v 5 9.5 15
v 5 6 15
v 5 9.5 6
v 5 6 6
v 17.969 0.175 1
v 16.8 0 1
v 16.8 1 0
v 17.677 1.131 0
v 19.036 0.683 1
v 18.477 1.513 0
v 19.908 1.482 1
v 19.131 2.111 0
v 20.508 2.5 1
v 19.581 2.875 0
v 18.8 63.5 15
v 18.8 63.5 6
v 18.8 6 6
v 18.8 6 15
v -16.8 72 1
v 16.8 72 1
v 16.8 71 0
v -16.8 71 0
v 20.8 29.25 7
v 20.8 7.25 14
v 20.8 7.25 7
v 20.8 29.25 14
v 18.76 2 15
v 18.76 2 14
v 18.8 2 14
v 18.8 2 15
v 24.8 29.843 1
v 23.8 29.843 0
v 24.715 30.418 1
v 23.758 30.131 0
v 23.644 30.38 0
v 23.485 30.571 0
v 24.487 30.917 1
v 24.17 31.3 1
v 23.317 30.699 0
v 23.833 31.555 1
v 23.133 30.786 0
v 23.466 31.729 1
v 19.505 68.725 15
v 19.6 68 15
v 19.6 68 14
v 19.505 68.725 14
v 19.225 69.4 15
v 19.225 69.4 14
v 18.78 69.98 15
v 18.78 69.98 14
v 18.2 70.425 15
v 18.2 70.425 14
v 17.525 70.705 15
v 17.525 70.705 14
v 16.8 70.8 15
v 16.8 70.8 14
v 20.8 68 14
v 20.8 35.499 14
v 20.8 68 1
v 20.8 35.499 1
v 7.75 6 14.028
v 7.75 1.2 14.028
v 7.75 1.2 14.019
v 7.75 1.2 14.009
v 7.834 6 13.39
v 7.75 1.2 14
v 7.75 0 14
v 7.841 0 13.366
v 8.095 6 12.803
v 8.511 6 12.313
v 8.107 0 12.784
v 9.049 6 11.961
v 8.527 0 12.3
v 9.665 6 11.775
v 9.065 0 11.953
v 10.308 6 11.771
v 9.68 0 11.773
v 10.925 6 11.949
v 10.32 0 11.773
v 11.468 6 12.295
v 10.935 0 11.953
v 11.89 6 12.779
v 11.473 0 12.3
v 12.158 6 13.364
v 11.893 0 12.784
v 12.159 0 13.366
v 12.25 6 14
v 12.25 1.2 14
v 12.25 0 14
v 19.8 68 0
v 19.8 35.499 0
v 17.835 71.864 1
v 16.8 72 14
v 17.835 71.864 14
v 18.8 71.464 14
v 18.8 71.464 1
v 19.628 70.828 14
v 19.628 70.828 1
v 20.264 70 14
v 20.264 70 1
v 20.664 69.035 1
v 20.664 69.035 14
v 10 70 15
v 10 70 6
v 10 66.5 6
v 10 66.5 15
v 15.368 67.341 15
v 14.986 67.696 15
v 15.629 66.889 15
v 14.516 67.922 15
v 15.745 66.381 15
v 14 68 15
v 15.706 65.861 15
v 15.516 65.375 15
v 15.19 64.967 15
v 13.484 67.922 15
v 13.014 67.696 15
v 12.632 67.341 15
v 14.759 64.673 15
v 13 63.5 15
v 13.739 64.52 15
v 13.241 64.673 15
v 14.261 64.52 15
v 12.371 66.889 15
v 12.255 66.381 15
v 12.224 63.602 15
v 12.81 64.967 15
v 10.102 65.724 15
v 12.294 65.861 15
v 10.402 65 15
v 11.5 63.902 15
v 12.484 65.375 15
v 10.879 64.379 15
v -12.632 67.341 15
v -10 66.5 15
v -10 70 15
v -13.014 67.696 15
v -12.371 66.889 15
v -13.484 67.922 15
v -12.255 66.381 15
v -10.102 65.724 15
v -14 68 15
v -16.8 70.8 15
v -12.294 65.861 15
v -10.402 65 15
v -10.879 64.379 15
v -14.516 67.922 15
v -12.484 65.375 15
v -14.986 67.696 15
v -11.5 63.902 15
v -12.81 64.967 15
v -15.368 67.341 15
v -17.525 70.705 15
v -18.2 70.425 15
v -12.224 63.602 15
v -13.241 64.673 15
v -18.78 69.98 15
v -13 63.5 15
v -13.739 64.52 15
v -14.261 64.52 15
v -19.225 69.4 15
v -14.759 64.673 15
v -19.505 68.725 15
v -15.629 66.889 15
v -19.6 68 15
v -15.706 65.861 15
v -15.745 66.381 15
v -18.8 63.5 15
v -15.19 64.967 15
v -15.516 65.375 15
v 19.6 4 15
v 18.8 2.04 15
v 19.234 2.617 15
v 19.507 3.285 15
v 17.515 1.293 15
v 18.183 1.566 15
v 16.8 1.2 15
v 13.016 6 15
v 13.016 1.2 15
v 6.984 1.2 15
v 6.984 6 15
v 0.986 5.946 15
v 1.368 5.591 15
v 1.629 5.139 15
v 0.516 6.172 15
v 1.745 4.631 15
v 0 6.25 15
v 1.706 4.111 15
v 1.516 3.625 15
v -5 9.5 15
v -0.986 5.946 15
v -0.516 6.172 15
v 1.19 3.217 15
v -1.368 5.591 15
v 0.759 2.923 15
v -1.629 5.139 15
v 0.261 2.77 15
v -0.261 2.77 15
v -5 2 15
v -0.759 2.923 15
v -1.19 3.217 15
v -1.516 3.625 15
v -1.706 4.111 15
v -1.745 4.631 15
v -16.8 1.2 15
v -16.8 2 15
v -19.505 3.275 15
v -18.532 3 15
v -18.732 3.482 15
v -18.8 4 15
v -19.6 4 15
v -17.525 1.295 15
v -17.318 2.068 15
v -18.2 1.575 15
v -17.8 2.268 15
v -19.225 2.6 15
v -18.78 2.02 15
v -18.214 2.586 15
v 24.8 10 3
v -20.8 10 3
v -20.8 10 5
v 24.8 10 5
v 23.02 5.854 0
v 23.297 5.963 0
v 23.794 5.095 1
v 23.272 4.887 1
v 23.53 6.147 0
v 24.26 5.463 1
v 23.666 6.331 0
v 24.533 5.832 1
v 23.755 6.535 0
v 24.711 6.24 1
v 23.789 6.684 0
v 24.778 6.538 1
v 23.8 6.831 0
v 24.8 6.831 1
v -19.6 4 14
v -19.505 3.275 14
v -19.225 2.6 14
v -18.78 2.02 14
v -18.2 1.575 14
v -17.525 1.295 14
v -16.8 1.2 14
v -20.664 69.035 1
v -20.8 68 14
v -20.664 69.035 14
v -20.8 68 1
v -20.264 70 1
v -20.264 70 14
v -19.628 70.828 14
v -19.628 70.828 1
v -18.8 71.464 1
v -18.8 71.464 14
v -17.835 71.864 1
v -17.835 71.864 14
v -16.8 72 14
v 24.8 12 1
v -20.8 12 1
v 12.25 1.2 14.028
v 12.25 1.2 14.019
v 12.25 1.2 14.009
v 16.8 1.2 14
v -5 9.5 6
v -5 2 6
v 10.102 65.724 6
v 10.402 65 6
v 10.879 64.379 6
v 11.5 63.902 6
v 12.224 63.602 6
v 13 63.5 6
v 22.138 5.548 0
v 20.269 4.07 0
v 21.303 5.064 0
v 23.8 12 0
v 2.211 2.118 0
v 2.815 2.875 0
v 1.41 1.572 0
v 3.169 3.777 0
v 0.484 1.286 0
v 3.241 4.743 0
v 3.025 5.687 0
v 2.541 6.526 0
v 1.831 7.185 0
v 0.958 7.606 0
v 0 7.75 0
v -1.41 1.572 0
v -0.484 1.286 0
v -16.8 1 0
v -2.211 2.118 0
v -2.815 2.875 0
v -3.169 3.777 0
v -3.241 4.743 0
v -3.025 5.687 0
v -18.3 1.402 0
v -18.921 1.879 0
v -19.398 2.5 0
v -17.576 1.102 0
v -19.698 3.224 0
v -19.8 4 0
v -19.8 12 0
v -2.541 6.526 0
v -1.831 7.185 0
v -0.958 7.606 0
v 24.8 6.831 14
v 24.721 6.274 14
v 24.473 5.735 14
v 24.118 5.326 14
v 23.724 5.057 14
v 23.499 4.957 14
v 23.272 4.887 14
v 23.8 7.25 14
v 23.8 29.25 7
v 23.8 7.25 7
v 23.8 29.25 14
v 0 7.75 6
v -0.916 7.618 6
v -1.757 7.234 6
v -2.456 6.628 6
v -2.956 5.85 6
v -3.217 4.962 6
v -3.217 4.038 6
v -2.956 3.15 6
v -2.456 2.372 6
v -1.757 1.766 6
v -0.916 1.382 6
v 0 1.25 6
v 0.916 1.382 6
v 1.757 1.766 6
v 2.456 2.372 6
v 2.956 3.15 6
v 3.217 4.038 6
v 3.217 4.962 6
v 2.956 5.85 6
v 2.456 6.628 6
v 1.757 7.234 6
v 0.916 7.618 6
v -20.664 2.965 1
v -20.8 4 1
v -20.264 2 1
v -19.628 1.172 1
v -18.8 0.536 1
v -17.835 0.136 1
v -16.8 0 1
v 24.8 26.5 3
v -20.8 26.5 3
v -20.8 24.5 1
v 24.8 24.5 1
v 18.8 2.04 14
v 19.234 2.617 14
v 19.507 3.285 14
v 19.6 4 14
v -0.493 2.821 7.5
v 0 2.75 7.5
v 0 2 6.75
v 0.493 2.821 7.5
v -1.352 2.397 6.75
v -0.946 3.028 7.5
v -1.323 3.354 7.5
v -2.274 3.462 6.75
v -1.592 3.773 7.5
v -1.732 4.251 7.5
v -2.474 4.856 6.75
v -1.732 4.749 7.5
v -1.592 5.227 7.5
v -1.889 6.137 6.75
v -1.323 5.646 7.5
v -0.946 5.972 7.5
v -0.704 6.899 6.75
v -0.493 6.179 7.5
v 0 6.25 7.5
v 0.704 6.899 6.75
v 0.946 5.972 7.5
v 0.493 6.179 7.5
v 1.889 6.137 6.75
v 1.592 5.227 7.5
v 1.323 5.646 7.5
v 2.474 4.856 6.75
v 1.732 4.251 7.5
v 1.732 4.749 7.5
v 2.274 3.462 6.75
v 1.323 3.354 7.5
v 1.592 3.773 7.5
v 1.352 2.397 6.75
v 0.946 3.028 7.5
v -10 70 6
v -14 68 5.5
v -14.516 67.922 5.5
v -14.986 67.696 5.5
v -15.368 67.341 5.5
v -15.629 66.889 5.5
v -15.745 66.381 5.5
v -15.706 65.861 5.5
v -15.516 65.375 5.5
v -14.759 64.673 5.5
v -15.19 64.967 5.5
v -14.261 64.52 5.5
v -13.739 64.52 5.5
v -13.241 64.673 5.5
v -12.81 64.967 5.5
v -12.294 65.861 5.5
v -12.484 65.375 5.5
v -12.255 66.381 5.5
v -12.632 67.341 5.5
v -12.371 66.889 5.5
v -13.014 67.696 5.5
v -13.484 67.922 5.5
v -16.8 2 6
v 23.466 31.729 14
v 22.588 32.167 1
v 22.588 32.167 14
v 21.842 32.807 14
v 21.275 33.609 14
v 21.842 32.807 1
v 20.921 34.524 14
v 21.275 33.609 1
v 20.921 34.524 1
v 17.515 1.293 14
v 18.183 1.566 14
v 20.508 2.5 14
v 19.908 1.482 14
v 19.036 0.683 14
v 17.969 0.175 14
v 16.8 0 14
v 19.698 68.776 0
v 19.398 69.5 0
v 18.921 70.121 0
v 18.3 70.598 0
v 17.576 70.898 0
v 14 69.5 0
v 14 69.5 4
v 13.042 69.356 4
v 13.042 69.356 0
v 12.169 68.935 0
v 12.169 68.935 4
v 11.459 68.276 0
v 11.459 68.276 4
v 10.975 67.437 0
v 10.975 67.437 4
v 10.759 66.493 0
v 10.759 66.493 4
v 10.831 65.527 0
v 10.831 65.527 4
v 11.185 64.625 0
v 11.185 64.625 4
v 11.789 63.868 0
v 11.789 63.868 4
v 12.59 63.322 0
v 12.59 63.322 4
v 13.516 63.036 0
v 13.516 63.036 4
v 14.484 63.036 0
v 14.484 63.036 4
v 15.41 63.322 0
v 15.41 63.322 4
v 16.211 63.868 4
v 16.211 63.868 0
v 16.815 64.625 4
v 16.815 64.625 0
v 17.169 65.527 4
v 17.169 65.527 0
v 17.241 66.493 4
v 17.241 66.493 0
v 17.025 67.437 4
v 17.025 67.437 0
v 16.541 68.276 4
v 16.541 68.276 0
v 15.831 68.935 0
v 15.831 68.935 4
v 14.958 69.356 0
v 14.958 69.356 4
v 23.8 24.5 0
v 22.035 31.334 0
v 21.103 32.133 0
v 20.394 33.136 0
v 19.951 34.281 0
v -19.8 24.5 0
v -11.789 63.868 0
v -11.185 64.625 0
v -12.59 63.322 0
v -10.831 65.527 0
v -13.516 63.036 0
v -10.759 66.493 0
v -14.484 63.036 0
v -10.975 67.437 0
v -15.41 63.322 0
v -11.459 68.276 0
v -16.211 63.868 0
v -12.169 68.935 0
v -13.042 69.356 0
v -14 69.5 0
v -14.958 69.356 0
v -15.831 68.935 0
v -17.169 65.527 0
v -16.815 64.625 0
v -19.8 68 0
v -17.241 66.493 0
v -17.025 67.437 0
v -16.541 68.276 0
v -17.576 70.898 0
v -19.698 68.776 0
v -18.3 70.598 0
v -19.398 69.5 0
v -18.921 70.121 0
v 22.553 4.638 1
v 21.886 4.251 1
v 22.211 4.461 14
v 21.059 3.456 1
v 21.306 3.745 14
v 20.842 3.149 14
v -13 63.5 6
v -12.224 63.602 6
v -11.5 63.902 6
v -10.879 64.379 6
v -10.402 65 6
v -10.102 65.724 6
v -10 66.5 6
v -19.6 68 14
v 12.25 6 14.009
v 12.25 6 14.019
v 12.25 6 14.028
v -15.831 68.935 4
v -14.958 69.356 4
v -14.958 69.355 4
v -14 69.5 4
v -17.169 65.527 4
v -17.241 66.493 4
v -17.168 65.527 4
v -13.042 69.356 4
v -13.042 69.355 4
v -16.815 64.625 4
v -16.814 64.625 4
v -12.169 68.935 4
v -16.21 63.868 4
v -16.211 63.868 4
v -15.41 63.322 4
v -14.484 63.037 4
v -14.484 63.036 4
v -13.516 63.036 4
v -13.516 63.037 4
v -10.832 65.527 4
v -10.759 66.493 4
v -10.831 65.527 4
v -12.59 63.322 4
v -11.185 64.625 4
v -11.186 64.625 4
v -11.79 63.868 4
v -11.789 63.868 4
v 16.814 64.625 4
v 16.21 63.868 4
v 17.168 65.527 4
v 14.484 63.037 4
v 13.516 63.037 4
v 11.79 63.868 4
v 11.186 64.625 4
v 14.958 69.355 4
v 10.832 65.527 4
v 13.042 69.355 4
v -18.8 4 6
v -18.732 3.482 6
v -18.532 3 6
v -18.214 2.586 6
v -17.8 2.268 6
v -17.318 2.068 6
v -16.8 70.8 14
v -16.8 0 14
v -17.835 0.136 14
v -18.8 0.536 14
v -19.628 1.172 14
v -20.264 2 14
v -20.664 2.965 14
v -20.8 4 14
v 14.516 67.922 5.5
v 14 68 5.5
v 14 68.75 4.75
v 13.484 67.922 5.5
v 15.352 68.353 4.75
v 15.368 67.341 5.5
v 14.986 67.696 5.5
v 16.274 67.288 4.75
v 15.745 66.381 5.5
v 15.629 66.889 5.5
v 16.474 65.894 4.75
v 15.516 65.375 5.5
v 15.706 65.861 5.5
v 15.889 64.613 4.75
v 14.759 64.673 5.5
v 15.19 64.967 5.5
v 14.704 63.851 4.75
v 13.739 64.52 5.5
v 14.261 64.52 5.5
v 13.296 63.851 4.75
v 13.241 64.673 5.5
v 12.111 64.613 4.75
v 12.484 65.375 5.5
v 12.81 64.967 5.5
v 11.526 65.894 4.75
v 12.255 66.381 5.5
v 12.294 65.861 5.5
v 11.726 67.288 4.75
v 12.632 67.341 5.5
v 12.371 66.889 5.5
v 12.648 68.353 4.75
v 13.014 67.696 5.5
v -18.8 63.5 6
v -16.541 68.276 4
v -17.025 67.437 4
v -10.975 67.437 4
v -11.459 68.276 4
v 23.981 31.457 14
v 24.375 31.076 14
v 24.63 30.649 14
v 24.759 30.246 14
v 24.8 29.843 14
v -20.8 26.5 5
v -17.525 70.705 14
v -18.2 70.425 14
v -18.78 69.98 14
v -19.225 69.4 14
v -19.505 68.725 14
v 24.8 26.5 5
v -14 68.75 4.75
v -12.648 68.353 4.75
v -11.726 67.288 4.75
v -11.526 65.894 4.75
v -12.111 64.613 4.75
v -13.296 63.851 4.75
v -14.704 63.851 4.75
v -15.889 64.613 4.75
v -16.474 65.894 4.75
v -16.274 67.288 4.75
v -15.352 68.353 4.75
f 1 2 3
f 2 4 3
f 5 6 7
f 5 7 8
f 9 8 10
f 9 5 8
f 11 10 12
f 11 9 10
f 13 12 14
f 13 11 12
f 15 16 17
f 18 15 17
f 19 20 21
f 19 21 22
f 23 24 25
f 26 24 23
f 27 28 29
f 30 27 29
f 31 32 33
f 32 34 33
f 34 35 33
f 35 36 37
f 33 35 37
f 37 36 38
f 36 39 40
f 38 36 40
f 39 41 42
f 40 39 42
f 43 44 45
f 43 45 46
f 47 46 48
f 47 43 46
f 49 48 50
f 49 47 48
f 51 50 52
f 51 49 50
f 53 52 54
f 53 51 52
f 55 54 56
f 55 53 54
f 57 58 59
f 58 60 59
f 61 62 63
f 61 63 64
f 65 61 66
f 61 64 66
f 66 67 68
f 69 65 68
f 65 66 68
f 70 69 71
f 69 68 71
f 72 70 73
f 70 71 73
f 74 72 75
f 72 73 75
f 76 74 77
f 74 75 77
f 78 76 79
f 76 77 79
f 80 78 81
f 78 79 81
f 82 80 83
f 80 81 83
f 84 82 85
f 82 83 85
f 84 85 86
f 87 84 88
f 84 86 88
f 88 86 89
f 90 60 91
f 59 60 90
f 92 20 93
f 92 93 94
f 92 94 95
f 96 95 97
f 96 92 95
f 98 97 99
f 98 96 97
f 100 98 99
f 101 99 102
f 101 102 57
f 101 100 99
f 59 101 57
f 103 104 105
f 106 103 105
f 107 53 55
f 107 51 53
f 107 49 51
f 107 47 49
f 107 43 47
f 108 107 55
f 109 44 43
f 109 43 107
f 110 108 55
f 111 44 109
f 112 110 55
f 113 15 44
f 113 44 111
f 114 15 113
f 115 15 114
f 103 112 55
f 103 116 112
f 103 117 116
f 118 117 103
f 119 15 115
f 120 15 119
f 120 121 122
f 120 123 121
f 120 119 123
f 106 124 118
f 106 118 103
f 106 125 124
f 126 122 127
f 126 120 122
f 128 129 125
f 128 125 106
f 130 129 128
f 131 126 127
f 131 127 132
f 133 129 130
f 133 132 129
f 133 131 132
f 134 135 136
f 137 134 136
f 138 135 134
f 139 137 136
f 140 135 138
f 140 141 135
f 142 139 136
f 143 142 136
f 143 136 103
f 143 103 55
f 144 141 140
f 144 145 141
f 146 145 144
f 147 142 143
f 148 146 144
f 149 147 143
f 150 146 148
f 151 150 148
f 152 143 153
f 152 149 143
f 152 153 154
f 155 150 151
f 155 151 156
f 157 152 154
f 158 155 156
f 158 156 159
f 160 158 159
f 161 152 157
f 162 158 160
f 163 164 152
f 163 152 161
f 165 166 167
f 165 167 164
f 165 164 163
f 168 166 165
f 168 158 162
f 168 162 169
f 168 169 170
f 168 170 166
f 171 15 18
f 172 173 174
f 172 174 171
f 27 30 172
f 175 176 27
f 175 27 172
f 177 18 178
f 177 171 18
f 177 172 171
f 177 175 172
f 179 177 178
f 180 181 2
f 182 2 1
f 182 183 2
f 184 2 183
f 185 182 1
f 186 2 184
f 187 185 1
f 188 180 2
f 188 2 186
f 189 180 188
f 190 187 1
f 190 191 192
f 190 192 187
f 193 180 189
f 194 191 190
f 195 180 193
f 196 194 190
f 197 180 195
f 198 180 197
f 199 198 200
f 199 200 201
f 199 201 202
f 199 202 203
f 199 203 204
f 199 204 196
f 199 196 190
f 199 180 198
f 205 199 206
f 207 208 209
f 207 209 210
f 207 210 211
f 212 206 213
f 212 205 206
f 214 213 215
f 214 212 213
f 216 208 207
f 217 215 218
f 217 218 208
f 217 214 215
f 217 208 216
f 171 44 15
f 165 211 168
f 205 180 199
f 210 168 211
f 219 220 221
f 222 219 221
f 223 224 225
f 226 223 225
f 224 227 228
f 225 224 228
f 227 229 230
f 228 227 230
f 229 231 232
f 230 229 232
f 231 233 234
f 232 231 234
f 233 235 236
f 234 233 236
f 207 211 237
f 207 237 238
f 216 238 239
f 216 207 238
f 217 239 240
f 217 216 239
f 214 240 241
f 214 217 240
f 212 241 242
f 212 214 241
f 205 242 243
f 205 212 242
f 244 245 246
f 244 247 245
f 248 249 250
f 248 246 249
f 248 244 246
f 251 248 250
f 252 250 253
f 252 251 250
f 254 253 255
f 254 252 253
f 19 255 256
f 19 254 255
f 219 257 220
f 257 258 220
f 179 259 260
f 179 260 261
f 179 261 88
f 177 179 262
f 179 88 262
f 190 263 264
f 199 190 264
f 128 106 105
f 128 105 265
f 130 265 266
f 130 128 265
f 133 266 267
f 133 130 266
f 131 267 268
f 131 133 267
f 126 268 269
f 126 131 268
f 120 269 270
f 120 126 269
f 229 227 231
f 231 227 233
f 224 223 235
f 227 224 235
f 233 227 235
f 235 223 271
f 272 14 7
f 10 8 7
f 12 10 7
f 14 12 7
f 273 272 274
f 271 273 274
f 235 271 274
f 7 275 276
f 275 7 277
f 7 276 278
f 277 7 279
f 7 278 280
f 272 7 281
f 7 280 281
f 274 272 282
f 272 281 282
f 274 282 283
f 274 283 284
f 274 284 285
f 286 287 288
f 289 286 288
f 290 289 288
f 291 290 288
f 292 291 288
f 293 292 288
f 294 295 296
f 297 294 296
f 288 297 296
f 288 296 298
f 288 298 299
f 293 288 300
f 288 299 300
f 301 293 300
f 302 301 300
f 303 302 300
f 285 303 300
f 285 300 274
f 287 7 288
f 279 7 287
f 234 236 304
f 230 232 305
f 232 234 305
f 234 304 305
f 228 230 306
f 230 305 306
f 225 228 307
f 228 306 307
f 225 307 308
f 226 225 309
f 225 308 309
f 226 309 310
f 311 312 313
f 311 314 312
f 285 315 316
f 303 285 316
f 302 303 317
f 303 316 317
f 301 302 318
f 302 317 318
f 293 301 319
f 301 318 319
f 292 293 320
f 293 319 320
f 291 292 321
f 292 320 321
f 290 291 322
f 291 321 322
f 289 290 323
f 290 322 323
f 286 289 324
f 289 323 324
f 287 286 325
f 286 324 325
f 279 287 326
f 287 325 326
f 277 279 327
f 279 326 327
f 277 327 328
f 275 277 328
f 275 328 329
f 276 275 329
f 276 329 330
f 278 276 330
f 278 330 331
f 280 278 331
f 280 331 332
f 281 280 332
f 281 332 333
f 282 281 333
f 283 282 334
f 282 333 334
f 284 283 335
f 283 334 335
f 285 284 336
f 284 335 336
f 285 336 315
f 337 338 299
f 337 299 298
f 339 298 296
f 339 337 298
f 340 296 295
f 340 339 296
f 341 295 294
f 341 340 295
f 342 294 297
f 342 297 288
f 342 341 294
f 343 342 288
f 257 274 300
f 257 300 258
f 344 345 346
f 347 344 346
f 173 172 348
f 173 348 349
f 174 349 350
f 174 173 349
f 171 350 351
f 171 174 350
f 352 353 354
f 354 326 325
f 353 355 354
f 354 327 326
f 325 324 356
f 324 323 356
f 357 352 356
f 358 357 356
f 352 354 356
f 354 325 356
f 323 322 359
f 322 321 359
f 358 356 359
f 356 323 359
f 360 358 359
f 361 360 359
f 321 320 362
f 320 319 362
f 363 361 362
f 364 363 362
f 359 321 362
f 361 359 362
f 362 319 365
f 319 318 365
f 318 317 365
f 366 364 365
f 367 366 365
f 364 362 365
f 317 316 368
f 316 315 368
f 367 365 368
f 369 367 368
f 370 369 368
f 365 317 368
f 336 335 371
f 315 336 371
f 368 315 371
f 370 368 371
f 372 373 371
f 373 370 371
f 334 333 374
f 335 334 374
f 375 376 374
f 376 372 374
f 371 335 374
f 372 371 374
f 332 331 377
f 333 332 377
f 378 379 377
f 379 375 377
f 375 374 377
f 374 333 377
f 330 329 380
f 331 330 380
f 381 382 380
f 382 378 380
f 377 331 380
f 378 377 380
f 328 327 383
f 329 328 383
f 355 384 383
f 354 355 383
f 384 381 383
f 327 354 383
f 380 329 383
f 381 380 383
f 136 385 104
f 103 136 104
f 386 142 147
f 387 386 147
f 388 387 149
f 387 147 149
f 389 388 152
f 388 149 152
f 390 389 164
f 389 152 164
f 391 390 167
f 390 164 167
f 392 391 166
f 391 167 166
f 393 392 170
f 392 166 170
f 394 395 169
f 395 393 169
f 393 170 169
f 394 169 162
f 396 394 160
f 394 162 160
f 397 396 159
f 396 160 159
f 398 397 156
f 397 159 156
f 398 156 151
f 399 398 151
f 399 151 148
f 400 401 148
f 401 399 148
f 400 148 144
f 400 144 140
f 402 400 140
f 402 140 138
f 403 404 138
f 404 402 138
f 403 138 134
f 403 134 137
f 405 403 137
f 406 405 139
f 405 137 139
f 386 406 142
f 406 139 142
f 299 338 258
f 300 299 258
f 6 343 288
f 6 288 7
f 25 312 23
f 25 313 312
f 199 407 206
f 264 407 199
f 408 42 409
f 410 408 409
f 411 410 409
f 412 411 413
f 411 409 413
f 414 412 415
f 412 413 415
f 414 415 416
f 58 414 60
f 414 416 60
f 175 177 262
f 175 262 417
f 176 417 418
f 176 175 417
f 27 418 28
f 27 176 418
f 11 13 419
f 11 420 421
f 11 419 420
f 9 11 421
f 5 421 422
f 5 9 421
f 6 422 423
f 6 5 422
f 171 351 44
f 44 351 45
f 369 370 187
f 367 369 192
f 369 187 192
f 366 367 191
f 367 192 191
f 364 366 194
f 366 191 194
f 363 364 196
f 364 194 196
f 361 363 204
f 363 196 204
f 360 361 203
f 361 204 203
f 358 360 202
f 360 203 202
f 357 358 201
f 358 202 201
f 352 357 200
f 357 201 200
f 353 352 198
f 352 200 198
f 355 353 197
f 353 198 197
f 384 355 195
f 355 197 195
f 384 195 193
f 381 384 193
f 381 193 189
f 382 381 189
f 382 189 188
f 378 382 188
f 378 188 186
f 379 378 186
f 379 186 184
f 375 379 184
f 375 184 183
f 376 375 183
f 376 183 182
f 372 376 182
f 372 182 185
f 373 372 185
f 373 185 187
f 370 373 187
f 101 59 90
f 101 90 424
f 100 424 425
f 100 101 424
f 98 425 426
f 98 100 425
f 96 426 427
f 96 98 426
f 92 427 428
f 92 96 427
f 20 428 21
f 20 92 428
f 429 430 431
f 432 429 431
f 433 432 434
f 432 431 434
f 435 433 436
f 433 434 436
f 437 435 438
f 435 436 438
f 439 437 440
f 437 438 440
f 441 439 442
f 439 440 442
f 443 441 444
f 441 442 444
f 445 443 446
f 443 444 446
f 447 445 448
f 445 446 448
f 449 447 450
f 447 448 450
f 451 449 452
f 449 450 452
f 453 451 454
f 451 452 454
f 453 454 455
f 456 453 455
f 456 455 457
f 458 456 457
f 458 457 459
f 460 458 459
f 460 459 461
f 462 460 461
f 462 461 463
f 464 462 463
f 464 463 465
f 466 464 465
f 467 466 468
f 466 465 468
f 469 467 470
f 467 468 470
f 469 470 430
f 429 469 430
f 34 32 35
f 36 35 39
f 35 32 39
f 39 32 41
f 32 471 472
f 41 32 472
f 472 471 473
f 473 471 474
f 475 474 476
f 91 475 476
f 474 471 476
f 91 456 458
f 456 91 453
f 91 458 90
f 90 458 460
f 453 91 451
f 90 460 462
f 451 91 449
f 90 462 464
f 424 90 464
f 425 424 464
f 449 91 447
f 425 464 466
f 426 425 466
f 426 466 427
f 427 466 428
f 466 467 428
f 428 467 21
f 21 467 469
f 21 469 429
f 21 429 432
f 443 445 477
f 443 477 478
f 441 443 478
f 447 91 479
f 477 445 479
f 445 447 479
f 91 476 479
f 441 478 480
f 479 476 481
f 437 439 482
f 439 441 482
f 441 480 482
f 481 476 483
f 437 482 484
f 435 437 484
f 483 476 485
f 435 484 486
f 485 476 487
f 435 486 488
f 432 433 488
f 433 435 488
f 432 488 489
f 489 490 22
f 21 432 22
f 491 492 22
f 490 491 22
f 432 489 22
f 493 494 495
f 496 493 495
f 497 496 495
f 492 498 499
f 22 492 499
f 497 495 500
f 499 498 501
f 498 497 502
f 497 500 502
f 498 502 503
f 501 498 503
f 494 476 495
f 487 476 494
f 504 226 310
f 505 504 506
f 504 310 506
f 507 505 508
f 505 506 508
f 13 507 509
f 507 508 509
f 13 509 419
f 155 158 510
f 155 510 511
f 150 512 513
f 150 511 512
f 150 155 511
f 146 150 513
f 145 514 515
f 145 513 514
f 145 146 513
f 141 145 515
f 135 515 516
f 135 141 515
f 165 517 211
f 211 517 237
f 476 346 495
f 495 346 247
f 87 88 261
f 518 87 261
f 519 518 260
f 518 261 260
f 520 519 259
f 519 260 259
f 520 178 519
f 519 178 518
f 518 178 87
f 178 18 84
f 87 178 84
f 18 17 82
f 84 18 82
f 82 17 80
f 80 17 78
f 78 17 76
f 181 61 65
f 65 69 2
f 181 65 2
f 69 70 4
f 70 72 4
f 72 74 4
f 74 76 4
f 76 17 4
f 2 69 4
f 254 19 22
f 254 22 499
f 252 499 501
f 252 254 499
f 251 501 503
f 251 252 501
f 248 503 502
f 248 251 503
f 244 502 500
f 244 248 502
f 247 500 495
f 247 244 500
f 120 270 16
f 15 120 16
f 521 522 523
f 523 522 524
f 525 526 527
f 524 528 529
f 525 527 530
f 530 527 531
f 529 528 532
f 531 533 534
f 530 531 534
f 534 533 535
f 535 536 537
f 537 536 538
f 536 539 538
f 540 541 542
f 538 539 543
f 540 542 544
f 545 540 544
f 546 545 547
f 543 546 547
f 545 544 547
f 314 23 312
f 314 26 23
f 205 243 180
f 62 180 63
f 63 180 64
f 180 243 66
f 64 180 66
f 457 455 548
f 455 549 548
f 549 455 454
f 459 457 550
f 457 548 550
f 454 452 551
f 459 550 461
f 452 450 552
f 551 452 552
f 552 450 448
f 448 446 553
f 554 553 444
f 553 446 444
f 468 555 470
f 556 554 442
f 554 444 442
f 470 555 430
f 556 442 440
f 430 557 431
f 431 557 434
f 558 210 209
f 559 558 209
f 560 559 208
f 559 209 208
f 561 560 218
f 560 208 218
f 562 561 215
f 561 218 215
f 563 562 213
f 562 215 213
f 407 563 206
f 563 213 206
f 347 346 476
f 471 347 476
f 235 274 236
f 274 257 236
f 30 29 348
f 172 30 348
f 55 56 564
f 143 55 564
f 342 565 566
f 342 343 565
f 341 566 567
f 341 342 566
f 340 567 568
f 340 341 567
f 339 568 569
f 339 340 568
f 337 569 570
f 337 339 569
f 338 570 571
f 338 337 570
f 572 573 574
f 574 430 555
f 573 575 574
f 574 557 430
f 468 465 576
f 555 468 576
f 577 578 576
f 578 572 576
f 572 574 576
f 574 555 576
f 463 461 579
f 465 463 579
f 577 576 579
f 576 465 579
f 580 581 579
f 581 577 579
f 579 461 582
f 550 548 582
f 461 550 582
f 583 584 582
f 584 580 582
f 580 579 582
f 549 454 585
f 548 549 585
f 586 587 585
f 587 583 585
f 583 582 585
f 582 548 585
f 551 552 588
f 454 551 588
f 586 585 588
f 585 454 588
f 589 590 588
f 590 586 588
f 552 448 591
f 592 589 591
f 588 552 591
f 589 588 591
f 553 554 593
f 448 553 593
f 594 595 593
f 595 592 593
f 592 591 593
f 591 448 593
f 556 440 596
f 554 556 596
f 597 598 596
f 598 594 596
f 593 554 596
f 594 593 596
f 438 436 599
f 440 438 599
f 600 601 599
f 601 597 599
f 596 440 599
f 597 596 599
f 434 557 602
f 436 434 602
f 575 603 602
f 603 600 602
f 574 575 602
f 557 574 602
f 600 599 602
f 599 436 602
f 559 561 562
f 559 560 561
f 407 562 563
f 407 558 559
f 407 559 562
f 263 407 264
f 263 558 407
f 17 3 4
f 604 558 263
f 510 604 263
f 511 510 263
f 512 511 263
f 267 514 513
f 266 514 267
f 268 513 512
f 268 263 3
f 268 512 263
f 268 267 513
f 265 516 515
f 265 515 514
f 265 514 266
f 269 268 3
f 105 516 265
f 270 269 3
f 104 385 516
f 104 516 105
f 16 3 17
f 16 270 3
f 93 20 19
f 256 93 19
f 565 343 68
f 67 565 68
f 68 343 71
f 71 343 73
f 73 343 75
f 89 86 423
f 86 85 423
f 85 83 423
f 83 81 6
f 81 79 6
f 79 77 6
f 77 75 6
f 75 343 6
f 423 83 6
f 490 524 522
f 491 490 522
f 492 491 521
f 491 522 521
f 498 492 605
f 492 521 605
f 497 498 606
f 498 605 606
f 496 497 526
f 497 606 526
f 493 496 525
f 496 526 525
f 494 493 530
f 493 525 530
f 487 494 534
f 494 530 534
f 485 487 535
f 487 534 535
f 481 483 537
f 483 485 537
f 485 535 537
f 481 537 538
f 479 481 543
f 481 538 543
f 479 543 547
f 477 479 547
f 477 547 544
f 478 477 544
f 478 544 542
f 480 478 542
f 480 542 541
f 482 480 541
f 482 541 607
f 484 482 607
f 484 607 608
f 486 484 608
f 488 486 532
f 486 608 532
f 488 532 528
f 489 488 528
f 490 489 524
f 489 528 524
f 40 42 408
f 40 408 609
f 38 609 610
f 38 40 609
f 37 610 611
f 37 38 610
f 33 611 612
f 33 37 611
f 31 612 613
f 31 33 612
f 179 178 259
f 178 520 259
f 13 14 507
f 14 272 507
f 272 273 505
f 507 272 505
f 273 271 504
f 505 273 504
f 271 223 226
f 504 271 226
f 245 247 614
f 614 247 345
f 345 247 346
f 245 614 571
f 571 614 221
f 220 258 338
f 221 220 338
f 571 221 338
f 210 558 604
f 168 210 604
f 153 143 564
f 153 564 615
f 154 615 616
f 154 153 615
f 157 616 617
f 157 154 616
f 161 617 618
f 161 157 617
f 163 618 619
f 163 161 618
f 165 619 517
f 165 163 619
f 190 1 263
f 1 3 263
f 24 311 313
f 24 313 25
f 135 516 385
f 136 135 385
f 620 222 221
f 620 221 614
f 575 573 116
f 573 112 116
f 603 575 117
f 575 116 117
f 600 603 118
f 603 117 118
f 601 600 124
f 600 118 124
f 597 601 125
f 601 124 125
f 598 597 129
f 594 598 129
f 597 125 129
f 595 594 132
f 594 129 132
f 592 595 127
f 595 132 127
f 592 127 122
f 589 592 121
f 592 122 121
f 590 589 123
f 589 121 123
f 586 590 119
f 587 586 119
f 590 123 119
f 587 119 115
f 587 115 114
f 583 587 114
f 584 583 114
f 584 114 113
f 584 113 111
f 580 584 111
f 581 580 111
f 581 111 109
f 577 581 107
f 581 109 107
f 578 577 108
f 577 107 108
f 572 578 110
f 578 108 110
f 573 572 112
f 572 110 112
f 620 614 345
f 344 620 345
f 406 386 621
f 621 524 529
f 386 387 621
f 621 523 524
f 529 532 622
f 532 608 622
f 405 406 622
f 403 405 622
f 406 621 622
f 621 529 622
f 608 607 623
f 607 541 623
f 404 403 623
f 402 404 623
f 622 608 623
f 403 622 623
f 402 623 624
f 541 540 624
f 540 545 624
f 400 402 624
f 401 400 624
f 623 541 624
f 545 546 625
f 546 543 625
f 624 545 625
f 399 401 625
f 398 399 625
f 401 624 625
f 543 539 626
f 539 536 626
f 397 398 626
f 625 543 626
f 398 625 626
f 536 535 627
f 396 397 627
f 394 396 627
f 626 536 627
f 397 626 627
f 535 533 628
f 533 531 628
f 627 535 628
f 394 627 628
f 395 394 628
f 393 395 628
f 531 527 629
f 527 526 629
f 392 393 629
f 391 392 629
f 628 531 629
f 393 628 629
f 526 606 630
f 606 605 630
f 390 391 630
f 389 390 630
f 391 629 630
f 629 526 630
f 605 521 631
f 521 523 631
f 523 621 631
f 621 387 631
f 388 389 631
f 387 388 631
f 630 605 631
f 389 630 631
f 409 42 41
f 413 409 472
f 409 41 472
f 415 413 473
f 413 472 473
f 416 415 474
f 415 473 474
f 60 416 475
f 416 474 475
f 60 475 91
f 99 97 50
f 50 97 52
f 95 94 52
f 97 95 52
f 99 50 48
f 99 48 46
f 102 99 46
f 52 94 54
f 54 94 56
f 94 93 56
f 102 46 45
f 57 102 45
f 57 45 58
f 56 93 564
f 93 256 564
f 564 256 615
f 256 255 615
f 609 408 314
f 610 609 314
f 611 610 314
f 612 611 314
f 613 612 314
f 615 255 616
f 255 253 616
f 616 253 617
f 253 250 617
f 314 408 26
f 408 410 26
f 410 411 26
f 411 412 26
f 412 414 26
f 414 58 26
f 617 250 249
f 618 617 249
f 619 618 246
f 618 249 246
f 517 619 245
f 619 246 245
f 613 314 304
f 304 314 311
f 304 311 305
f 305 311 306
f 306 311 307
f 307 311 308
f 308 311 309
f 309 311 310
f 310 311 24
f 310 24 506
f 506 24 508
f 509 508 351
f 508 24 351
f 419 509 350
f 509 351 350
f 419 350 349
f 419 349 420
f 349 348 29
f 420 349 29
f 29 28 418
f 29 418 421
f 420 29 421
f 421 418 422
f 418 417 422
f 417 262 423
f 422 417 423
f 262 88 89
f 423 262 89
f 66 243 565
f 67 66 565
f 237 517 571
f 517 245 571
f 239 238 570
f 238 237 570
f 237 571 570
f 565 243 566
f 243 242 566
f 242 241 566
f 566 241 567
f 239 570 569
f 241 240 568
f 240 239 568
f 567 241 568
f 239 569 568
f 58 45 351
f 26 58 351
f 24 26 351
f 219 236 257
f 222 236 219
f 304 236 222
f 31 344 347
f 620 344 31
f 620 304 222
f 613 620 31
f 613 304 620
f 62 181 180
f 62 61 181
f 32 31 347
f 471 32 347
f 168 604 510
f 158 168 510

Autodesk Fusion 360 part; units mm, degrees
sketch "Skizze1" plane through (0, 0, 0) normal (0, 0, 1) x (1, 0, 0)
  line L0 (0, 0) -> (20.8, 0)
  line L1 (20.8, 0) -> (20.8, 72)
  line L2 (20.8, 72) -> (0, 72)
  line L3 (0, 72) -> (0, 0)
  dimension "d1" = 20.8
  dimension "d2" = 72
extrude "Extrusion1" add sketch "Skizze1" along normal blind 6
sketch "Skizze2" plane through (0, 0, 0) normal (-1, 0, 0) x (0, -1, 0)
  line L0 (-72, 0) -> (0, 0)
  line L1 (0, 0) -> (0, 6)
  line L2 (0, 6) -> (-72, 6)
  line L3 (-72, 6) -> (-72, 0)
  line L4 (-24.5, 0) -> (-12, 0)
  line L5 (-12, 0) -> (-12, 1)
  line L6 (-12, 1) -> (-10, 3)
  line L7 (-10, 3) -> (-10, 5)
  line L8 (-10, 5) -> (-26.5, 5)
  line L9 (-26.5, 5) -> (-26.5, 3)
  line L10 (-26.5, 3) -> (-24.5, 1)
  line L11 (-24.5, 1) -> (-24.5, 0)
  dimension "d5" = 16.5
  dimension "d6" = 1
  dimension "d7" = 1
  dimension "d8" = 45
  dimension "d9" = 45
  dimension "d10" = 2
  dimension "d11" = 2
  dimension "d12" = 2
  dimension "d13" = 10
extrude "Extrusion2" cut sketch "Skizze2" against normal through all contours L0 L4 L5 L6 L7 L8 L9 L10 L11
sketch "Skizze3" plane through (0, 0, 6) normal (0, 0, 1) x (-1, 0, 0)
  line L0 (0, -72) -> (0, 0)
  line L1 (0, 0) -> (-20.8, 0)
  line L2 (-20.8, 0) -> (-20.8, -72)
  line L3 (-20.8, -72) -> (0, -72)
  line L4 (0, -72) -> (-20.8, -72)
  line L5 (-20.8, -72) -> (-20.8, 0)
  line L6 (-20.8, 0) -> (0, 0)
  line L7 (0, 0) -> (0, -2)
  line L8 (0, -2) -> (-18.8, -2)
  line L9 (-18.8, -2) -> (-18.8, -70)
  line L10 (-18.8, -70) -> (0, -70)
  line L11 (0, -70) -> (0, -72)
  dimension "d15" = 2
  dimension "d16" = 2
  dimension "d17" = 2
extrude "Extrusion3" add sketch "Skizze3" along normal blind 8 contours L0 L1 L2 L3 L4 L5 L6 L7 L8 L9 L10 L11
sketch "Skizze4" plane through (0, 0, 14) normal (0, 0, 1) x (-1, 0, 0)
  line L0 (0, -70) -> (-18.8, -70)
  line L1 (-18.8, -70) -> (-18.8, -2)
  line L2 (-18.8, -2) -> (0, -2)
  line L3 (0, -70) -> (-18.8, -70)
  line L4 (-18.8, -70) -> (-18.8, -2)
  line L5 (-18.8, -2) -> (0, -2)
  line L6 (0, -2) -> (0, -1.2)
  line L7 (0, -1.2) -> (-19.6, -1.2)
  line L8 (-19.6, -1.2) -> (-19.6, -70.8)
  line L9 (-19.6, -70.8) -> (0, -70.8)
  line L10 (0, -70.8) -> (0, -70)
  dimension "d49" = 0.8
  dimension "d50" = 0.8
  dimension "d51" = 0.8
extrude "Extrusion4" add sketch "Skizze4" along normal blind 1
sketch "Skizze5" plane through (0, 0, 6) normal (0, 0, 1) x (-1, 0, 0)
  line L0 (0, -2) -> (-18.8, -2)
  line L1 (-18.8, -2) -> (-18.8, -70)
  line L2 (-18.8, -70) -> (0, -70)
  line L3 (0, -70) -> (0, -2)
  line L4 (-18.8, -70) -> (-10, -70)
  line L5 (-10, -70) -> (-10, -63.5)
  line L6 (-10, -63.5) -> (-18.8, -63.5)
  line L7 (-18.8, -63.5) -> (-18.8, -70)
  dimension "d25" = 10
  dimension "d26" = 6.5
extrude "Extrusion5" add sketch "Skizze5" along normal blind 9 contours L1 L2 L4 L5 L6 L7
sketch "Skizze7" plane through (0, 0, 0) normal (0, 0, -1) x (1, 0, 0)
  line L0 (20.8, -24.5) -> (0, -24.5)
  line L1 (0, -24.5) -> (0, -72)
  line L2 (0, -72) -> (20.8, -72)
  line L3 (20.8, -72) -> (20.8, -24.5)
  point P0 (14, -66.25)
  dimension "d31" = 14
  dimension "d32" = 5.75
hole "Bohrung1" at (14, 66.25, 0) direction (0, 0, 1) diameter 3.5 end through all counterbore diameter 6.5 counterbore depth 4
chamfer "Fase1" distance 1.5 angle 45 1 edges at (15.6316, 66.8828, 4)
sketch "Skizze8" plane through (0, 0, 6) normal (0, 0, 1) x (-1, 0, 0)
  line L0 (-18.8, -63.5) -> (-10, -63.5)
  line L1 (-10, -63.5) -> (-10, -70)
  line L2 (-10, -70) -> (0, -70)
  line L3 (0, -70) -> (0, -2)
  line L4 (0, -2) -> (-18.8, -2)
  line L5 (-18.8, -2) -> (-18.8, -63.5)
  line L6 (0, -2) -> (-5, -2)
  line L7 (-5, -2) -> (-5, -9.5)
  line L8 (-5, -9.5) -> (0, -9.5)
  line L9 (0, -9.5) -> (0, -2)
  dimension "d38" = 5
  dimension "d39" = 9.5
extrude "Extrusion6" add sketch "Skizze8" along normal blind 9 contours L3 L4 L6 L7 L8 L9
sketch "Skizze9" plane through (0, 0, 0) normal (0, 0, -1) x (1, 0, 0)
  line L0 (0, -12) -> (20.8, -12)
  line L1 (20.8, -12) -> (20.8, 0)
  line L2 (20.8, 0) -> (0, 0)
  line L3 (0, 0) -> (0, -12)
  point P0 (0, -4.5)
  dimension "d42" = 4.5
hole "Bohrung2" at (0, 4.5, 0) direction (0, 0, 1) diameter 3.5 depth 16 tip angle 180 counterbore diameter 6.5 counterbore depth 6
chamfer "Fase2" distance 1.5 angle 45 1 edges at (1.75, 4.5, 6)
fillet "Abrundung6" radius 2 1 edges at (18.8, 2, 10.5)
fillet "Abrundung2" radius 2.8 2 edges at (19.6, 1.2, 14.5) (19.6, 70.8, 14.5)
fillet "Abrundung4" radius 4 2 edges at (20.8, 0, 7) (20.8, 72, 7)
fillet "Abrundung5" radius 3 1 edges at (10, 63.5, 10.5)
mirror "Spiegeln1" about plane through (0, 0, 0) normal (1, 0, 0) of bodies 1 merged
sketch "Skizze11" plane through (0, 0, 6) normal (0, 0, 1) x (-1, 0, 0)
  line L0 (-18.8, -4) -> (-18.8, -63.5)
  line L1 (-18.8, -63.5) -> (-13, -63.5)
  arc A0 (-10, -66.5) -> (-13, -63.5) centre (-13, -66.5) ccw
  line L2 (-10, -66.5) -> (-10, -70)
  line L3 (-10, -70) -> (10, -70)
  line L4 (10, -70) -> (10, -66.5)
  arc A1 (13, -63.5) -> (10, -66.5) centre (13, -66.5) ccw
  line L5 (13, -63.5) -> (18.8, -63.5)
  line L6 (18.8, -63.5) -> (18.8, -4)
  line L7 (16.8, -2) -> (5, -2)
  line L8 (5, -2) -> (5, -9.5)
  line L9 (5, -9.5) -> (-5, -9.5)
  line L10 (-5, -9.5) -> (-5, -2)
  line L11 (-5, -2) -> (-16.8, -2)
  line L12 (-5, -2) -> (-18.8, -2)
  line L13 (-18.8, -2) -> (-18.8, -6)
  line L14 (-18.8, -6) -> (-5, -6)
  line L15 (-5, -6) -> (-5, -2)
  arc A2 (-16.8, -2) -> (-18.8, -4) centre (-16.8, -4) ccw
  arc A3 (18.8, -4) -> (16.8, -2) centre (16.8, -4) ccw
  dimension "d68" = 4
extrude "Extrusion7" add sketch "Skizze11" along normal blind 9 contours L0 L10 L11 L12 L13 L14 L15 A2 | L12 L13 A2
sketch "Skizze10" plane through (0, 0, 0) normal (0, -1, 0) x (1, 0, 0)
  line L0 (16.8, 0) -> (16.8, 14)
  line L1 (16.8, 14) -> (-16.8, 14)
  line L2 (-16.8, 14) -> (-16.8, 0)
  circle A0 centre (10, 14) radius 2.25
  line L3 (-16.8, 0) -> (16.8, 0)
  dimension "d66" = 4.5
  dimension "d67" = 10
extrude "Extrusion8" cut sketch "Skizze10" against normal blind 12 contours L1 A0 | L1 A0
chamfer "Fase5" distance 1 angle 45 3 edges at (7.9844, 3.6, 15) (12.0156, 3.6, 15) (7.9844, 3.6, 15)
sketch "Skizze16" plane through (20.8, 0, 0) normal (1, 0, 0) x (0, 1, 0)
  line L0 (68, 0) -> (68, 14)
  line L1 (68, 14) -> (4, 14)
  line L2 (4, 14) -> (4, 0)
  line L3 (4, 0) -> (12, 0)
  line L4 (12, 0) -> (12, 1)
  line L5 (12, 1) -> (10, 3)
  line L6 (10, 3) -> (10, 5)
  line L7 (10, 5) -> (26.5, 5)
  line L8 (26.5, 5) -> (26.5, 3)
  line L9 (26.5, 3) -> (24.5, 1)
  line L10 (24.5, 1) -> (24.5, 0)
  line L11 (24.5, 0) -> (68, 0)
  line L12 (5, 14) -> (31.5, 14)
  line L13 (31.5, 14) -> (31.5, 0)
  line L14 (31.5, 0) -> (5, 0)
  line L15 (5, 0) -> (5, 14)
  dimension "d100" = 5
  dimension "d101" = 5
extrude "Extrusion12" add sketch "Skizze16" along normal blind 4 contours L1 L3 L4 L5 L6 L7 L8 L9 L10 L11 L12 L13 L14 L15
sketch "Skizze17" plane through (0, 0, 14) normal (0, 0, 1) x (-1, 0, 0)
  line L0 (-12.25, -1.2) -> (-12.25, 0)
  line L1 (-12.25, 0) -> (-16.8, 0)
  arc A0 (-16.8, 0) -> (-20.8, -4) centre (-16.8, -4) ccw
  line L2 (-20.8, -4) -> (-20.8, -5)
  line L3 (-20.8, -5) -> (-24.8, -5)
  line L4 (-24.8, -5) -> (-24.8, -31.5)
  line L5 (-24.8, -31.5) -> (-20.8, -31.5)
  line L6 (-20.8, -31.5) -> (-20.8, -68)
  arc A1 (-20.8, -68) -> (-16.8, -72) centre (-16.8, -68) ccw
  line L7 (-16.8, -72) -> (16.8, -72)
  arc A2 (16.8, -72) -> (20.8, -68) centre (16.8, -68) ccw
  line L8 (20.8, -68) -> (20.8, -4)
  arc A3 (20.8, -4) -> (16.8, 0) centre (16.8, -4) ccw
  line L9 (16.8, 0) -> (-7.75, 0)
  line L10 (-7.75, 0) -> (-7.75, -1.2)
  line L11 (-7.75, -1.2) -> (16.8, -1.2)
  arc A4 (19.6, -4) -> (16.8, -1.2) centre (16.8, -4) ccw
  line L12 (19.6, -4) -> (19.6, -68)
  arc A5 (16.8, -70.8) -> (19.6, -68) centre (16.8, -68) ccw
  line L13 (16.8, -70.8) -> (-16.8, -70.8)
  arc A6 (-19.6, -68) -> (-16.8, -70.8) centre (-16.8, -68) ccw
  line L14 (-19.6, -68) -> (-19.6, -4)
  arc A7 (-18.8, -2.0404) -> (-19.6, -4) centre (-16.8, -4) ccw
  line L15 (-18.8, -2.0404) -> (-18.8, -2)
  line L16 (-18.8, -2) -> (-18.7596, -2)
  arc A8 (-16.8, -1.2) -> (-18.7596, -2) centre (-16.8, -4) ccw
  line L17 (-16.8, -1.2) -> (-12.25, -1.2)
  line L18 (-20.8, -29.25) -> (-23.8, -29.25)
  line L19 (-23.8, -29.25) -> (-23.8, -7.25)
  line L20 (-23.8, -7.25) -> (-20.8, -7.25)
  line L21 (-20.8, -7.25) -> (-20.8, -29.25)
  dimension "d104" = 1
  dimension "d105" = 22
  dimension "d106" = 2.25
  dimension "d107" = 2.25
  dimension "d108" = 3
extrude "Extrusion13" cut sketch "Skizze17" against normal blind 7 contours L18 L19 L20 L21
fillet "Abrundung11" radius 4 2 edges at (20.8, 5, 7) (20.8, 31.5, 7)
fillet "Abrundung12" radius 2 2 edges at (24.8, 5, 7) (24.8, 31.5, 7)
chamfer "Fase7" distance 1 angle 45 15 edges at (19.0361, 0.6834, 0) (21.6018, 4.0273, 0) (24.3723, 5.5944, 0) (24.8, 9.4152, 0) (-20.8, 8, 0) (-19.6284, 1.1716, 0) (0, 0, 0) (20.8, 51.75, 0) (19.6284, 70.8284, 0) (0, 72, 0) (-19.6284, 70.8284, 0) (-20.8, 46.25, 0) (24.8, 27.1716, 0) (24.433, 30.9978, 0) (21.534, 33.1906, 0)
equation "d1 = ( 41.6 / 2 ) * 1 mm"
equation "d106 = d107"
